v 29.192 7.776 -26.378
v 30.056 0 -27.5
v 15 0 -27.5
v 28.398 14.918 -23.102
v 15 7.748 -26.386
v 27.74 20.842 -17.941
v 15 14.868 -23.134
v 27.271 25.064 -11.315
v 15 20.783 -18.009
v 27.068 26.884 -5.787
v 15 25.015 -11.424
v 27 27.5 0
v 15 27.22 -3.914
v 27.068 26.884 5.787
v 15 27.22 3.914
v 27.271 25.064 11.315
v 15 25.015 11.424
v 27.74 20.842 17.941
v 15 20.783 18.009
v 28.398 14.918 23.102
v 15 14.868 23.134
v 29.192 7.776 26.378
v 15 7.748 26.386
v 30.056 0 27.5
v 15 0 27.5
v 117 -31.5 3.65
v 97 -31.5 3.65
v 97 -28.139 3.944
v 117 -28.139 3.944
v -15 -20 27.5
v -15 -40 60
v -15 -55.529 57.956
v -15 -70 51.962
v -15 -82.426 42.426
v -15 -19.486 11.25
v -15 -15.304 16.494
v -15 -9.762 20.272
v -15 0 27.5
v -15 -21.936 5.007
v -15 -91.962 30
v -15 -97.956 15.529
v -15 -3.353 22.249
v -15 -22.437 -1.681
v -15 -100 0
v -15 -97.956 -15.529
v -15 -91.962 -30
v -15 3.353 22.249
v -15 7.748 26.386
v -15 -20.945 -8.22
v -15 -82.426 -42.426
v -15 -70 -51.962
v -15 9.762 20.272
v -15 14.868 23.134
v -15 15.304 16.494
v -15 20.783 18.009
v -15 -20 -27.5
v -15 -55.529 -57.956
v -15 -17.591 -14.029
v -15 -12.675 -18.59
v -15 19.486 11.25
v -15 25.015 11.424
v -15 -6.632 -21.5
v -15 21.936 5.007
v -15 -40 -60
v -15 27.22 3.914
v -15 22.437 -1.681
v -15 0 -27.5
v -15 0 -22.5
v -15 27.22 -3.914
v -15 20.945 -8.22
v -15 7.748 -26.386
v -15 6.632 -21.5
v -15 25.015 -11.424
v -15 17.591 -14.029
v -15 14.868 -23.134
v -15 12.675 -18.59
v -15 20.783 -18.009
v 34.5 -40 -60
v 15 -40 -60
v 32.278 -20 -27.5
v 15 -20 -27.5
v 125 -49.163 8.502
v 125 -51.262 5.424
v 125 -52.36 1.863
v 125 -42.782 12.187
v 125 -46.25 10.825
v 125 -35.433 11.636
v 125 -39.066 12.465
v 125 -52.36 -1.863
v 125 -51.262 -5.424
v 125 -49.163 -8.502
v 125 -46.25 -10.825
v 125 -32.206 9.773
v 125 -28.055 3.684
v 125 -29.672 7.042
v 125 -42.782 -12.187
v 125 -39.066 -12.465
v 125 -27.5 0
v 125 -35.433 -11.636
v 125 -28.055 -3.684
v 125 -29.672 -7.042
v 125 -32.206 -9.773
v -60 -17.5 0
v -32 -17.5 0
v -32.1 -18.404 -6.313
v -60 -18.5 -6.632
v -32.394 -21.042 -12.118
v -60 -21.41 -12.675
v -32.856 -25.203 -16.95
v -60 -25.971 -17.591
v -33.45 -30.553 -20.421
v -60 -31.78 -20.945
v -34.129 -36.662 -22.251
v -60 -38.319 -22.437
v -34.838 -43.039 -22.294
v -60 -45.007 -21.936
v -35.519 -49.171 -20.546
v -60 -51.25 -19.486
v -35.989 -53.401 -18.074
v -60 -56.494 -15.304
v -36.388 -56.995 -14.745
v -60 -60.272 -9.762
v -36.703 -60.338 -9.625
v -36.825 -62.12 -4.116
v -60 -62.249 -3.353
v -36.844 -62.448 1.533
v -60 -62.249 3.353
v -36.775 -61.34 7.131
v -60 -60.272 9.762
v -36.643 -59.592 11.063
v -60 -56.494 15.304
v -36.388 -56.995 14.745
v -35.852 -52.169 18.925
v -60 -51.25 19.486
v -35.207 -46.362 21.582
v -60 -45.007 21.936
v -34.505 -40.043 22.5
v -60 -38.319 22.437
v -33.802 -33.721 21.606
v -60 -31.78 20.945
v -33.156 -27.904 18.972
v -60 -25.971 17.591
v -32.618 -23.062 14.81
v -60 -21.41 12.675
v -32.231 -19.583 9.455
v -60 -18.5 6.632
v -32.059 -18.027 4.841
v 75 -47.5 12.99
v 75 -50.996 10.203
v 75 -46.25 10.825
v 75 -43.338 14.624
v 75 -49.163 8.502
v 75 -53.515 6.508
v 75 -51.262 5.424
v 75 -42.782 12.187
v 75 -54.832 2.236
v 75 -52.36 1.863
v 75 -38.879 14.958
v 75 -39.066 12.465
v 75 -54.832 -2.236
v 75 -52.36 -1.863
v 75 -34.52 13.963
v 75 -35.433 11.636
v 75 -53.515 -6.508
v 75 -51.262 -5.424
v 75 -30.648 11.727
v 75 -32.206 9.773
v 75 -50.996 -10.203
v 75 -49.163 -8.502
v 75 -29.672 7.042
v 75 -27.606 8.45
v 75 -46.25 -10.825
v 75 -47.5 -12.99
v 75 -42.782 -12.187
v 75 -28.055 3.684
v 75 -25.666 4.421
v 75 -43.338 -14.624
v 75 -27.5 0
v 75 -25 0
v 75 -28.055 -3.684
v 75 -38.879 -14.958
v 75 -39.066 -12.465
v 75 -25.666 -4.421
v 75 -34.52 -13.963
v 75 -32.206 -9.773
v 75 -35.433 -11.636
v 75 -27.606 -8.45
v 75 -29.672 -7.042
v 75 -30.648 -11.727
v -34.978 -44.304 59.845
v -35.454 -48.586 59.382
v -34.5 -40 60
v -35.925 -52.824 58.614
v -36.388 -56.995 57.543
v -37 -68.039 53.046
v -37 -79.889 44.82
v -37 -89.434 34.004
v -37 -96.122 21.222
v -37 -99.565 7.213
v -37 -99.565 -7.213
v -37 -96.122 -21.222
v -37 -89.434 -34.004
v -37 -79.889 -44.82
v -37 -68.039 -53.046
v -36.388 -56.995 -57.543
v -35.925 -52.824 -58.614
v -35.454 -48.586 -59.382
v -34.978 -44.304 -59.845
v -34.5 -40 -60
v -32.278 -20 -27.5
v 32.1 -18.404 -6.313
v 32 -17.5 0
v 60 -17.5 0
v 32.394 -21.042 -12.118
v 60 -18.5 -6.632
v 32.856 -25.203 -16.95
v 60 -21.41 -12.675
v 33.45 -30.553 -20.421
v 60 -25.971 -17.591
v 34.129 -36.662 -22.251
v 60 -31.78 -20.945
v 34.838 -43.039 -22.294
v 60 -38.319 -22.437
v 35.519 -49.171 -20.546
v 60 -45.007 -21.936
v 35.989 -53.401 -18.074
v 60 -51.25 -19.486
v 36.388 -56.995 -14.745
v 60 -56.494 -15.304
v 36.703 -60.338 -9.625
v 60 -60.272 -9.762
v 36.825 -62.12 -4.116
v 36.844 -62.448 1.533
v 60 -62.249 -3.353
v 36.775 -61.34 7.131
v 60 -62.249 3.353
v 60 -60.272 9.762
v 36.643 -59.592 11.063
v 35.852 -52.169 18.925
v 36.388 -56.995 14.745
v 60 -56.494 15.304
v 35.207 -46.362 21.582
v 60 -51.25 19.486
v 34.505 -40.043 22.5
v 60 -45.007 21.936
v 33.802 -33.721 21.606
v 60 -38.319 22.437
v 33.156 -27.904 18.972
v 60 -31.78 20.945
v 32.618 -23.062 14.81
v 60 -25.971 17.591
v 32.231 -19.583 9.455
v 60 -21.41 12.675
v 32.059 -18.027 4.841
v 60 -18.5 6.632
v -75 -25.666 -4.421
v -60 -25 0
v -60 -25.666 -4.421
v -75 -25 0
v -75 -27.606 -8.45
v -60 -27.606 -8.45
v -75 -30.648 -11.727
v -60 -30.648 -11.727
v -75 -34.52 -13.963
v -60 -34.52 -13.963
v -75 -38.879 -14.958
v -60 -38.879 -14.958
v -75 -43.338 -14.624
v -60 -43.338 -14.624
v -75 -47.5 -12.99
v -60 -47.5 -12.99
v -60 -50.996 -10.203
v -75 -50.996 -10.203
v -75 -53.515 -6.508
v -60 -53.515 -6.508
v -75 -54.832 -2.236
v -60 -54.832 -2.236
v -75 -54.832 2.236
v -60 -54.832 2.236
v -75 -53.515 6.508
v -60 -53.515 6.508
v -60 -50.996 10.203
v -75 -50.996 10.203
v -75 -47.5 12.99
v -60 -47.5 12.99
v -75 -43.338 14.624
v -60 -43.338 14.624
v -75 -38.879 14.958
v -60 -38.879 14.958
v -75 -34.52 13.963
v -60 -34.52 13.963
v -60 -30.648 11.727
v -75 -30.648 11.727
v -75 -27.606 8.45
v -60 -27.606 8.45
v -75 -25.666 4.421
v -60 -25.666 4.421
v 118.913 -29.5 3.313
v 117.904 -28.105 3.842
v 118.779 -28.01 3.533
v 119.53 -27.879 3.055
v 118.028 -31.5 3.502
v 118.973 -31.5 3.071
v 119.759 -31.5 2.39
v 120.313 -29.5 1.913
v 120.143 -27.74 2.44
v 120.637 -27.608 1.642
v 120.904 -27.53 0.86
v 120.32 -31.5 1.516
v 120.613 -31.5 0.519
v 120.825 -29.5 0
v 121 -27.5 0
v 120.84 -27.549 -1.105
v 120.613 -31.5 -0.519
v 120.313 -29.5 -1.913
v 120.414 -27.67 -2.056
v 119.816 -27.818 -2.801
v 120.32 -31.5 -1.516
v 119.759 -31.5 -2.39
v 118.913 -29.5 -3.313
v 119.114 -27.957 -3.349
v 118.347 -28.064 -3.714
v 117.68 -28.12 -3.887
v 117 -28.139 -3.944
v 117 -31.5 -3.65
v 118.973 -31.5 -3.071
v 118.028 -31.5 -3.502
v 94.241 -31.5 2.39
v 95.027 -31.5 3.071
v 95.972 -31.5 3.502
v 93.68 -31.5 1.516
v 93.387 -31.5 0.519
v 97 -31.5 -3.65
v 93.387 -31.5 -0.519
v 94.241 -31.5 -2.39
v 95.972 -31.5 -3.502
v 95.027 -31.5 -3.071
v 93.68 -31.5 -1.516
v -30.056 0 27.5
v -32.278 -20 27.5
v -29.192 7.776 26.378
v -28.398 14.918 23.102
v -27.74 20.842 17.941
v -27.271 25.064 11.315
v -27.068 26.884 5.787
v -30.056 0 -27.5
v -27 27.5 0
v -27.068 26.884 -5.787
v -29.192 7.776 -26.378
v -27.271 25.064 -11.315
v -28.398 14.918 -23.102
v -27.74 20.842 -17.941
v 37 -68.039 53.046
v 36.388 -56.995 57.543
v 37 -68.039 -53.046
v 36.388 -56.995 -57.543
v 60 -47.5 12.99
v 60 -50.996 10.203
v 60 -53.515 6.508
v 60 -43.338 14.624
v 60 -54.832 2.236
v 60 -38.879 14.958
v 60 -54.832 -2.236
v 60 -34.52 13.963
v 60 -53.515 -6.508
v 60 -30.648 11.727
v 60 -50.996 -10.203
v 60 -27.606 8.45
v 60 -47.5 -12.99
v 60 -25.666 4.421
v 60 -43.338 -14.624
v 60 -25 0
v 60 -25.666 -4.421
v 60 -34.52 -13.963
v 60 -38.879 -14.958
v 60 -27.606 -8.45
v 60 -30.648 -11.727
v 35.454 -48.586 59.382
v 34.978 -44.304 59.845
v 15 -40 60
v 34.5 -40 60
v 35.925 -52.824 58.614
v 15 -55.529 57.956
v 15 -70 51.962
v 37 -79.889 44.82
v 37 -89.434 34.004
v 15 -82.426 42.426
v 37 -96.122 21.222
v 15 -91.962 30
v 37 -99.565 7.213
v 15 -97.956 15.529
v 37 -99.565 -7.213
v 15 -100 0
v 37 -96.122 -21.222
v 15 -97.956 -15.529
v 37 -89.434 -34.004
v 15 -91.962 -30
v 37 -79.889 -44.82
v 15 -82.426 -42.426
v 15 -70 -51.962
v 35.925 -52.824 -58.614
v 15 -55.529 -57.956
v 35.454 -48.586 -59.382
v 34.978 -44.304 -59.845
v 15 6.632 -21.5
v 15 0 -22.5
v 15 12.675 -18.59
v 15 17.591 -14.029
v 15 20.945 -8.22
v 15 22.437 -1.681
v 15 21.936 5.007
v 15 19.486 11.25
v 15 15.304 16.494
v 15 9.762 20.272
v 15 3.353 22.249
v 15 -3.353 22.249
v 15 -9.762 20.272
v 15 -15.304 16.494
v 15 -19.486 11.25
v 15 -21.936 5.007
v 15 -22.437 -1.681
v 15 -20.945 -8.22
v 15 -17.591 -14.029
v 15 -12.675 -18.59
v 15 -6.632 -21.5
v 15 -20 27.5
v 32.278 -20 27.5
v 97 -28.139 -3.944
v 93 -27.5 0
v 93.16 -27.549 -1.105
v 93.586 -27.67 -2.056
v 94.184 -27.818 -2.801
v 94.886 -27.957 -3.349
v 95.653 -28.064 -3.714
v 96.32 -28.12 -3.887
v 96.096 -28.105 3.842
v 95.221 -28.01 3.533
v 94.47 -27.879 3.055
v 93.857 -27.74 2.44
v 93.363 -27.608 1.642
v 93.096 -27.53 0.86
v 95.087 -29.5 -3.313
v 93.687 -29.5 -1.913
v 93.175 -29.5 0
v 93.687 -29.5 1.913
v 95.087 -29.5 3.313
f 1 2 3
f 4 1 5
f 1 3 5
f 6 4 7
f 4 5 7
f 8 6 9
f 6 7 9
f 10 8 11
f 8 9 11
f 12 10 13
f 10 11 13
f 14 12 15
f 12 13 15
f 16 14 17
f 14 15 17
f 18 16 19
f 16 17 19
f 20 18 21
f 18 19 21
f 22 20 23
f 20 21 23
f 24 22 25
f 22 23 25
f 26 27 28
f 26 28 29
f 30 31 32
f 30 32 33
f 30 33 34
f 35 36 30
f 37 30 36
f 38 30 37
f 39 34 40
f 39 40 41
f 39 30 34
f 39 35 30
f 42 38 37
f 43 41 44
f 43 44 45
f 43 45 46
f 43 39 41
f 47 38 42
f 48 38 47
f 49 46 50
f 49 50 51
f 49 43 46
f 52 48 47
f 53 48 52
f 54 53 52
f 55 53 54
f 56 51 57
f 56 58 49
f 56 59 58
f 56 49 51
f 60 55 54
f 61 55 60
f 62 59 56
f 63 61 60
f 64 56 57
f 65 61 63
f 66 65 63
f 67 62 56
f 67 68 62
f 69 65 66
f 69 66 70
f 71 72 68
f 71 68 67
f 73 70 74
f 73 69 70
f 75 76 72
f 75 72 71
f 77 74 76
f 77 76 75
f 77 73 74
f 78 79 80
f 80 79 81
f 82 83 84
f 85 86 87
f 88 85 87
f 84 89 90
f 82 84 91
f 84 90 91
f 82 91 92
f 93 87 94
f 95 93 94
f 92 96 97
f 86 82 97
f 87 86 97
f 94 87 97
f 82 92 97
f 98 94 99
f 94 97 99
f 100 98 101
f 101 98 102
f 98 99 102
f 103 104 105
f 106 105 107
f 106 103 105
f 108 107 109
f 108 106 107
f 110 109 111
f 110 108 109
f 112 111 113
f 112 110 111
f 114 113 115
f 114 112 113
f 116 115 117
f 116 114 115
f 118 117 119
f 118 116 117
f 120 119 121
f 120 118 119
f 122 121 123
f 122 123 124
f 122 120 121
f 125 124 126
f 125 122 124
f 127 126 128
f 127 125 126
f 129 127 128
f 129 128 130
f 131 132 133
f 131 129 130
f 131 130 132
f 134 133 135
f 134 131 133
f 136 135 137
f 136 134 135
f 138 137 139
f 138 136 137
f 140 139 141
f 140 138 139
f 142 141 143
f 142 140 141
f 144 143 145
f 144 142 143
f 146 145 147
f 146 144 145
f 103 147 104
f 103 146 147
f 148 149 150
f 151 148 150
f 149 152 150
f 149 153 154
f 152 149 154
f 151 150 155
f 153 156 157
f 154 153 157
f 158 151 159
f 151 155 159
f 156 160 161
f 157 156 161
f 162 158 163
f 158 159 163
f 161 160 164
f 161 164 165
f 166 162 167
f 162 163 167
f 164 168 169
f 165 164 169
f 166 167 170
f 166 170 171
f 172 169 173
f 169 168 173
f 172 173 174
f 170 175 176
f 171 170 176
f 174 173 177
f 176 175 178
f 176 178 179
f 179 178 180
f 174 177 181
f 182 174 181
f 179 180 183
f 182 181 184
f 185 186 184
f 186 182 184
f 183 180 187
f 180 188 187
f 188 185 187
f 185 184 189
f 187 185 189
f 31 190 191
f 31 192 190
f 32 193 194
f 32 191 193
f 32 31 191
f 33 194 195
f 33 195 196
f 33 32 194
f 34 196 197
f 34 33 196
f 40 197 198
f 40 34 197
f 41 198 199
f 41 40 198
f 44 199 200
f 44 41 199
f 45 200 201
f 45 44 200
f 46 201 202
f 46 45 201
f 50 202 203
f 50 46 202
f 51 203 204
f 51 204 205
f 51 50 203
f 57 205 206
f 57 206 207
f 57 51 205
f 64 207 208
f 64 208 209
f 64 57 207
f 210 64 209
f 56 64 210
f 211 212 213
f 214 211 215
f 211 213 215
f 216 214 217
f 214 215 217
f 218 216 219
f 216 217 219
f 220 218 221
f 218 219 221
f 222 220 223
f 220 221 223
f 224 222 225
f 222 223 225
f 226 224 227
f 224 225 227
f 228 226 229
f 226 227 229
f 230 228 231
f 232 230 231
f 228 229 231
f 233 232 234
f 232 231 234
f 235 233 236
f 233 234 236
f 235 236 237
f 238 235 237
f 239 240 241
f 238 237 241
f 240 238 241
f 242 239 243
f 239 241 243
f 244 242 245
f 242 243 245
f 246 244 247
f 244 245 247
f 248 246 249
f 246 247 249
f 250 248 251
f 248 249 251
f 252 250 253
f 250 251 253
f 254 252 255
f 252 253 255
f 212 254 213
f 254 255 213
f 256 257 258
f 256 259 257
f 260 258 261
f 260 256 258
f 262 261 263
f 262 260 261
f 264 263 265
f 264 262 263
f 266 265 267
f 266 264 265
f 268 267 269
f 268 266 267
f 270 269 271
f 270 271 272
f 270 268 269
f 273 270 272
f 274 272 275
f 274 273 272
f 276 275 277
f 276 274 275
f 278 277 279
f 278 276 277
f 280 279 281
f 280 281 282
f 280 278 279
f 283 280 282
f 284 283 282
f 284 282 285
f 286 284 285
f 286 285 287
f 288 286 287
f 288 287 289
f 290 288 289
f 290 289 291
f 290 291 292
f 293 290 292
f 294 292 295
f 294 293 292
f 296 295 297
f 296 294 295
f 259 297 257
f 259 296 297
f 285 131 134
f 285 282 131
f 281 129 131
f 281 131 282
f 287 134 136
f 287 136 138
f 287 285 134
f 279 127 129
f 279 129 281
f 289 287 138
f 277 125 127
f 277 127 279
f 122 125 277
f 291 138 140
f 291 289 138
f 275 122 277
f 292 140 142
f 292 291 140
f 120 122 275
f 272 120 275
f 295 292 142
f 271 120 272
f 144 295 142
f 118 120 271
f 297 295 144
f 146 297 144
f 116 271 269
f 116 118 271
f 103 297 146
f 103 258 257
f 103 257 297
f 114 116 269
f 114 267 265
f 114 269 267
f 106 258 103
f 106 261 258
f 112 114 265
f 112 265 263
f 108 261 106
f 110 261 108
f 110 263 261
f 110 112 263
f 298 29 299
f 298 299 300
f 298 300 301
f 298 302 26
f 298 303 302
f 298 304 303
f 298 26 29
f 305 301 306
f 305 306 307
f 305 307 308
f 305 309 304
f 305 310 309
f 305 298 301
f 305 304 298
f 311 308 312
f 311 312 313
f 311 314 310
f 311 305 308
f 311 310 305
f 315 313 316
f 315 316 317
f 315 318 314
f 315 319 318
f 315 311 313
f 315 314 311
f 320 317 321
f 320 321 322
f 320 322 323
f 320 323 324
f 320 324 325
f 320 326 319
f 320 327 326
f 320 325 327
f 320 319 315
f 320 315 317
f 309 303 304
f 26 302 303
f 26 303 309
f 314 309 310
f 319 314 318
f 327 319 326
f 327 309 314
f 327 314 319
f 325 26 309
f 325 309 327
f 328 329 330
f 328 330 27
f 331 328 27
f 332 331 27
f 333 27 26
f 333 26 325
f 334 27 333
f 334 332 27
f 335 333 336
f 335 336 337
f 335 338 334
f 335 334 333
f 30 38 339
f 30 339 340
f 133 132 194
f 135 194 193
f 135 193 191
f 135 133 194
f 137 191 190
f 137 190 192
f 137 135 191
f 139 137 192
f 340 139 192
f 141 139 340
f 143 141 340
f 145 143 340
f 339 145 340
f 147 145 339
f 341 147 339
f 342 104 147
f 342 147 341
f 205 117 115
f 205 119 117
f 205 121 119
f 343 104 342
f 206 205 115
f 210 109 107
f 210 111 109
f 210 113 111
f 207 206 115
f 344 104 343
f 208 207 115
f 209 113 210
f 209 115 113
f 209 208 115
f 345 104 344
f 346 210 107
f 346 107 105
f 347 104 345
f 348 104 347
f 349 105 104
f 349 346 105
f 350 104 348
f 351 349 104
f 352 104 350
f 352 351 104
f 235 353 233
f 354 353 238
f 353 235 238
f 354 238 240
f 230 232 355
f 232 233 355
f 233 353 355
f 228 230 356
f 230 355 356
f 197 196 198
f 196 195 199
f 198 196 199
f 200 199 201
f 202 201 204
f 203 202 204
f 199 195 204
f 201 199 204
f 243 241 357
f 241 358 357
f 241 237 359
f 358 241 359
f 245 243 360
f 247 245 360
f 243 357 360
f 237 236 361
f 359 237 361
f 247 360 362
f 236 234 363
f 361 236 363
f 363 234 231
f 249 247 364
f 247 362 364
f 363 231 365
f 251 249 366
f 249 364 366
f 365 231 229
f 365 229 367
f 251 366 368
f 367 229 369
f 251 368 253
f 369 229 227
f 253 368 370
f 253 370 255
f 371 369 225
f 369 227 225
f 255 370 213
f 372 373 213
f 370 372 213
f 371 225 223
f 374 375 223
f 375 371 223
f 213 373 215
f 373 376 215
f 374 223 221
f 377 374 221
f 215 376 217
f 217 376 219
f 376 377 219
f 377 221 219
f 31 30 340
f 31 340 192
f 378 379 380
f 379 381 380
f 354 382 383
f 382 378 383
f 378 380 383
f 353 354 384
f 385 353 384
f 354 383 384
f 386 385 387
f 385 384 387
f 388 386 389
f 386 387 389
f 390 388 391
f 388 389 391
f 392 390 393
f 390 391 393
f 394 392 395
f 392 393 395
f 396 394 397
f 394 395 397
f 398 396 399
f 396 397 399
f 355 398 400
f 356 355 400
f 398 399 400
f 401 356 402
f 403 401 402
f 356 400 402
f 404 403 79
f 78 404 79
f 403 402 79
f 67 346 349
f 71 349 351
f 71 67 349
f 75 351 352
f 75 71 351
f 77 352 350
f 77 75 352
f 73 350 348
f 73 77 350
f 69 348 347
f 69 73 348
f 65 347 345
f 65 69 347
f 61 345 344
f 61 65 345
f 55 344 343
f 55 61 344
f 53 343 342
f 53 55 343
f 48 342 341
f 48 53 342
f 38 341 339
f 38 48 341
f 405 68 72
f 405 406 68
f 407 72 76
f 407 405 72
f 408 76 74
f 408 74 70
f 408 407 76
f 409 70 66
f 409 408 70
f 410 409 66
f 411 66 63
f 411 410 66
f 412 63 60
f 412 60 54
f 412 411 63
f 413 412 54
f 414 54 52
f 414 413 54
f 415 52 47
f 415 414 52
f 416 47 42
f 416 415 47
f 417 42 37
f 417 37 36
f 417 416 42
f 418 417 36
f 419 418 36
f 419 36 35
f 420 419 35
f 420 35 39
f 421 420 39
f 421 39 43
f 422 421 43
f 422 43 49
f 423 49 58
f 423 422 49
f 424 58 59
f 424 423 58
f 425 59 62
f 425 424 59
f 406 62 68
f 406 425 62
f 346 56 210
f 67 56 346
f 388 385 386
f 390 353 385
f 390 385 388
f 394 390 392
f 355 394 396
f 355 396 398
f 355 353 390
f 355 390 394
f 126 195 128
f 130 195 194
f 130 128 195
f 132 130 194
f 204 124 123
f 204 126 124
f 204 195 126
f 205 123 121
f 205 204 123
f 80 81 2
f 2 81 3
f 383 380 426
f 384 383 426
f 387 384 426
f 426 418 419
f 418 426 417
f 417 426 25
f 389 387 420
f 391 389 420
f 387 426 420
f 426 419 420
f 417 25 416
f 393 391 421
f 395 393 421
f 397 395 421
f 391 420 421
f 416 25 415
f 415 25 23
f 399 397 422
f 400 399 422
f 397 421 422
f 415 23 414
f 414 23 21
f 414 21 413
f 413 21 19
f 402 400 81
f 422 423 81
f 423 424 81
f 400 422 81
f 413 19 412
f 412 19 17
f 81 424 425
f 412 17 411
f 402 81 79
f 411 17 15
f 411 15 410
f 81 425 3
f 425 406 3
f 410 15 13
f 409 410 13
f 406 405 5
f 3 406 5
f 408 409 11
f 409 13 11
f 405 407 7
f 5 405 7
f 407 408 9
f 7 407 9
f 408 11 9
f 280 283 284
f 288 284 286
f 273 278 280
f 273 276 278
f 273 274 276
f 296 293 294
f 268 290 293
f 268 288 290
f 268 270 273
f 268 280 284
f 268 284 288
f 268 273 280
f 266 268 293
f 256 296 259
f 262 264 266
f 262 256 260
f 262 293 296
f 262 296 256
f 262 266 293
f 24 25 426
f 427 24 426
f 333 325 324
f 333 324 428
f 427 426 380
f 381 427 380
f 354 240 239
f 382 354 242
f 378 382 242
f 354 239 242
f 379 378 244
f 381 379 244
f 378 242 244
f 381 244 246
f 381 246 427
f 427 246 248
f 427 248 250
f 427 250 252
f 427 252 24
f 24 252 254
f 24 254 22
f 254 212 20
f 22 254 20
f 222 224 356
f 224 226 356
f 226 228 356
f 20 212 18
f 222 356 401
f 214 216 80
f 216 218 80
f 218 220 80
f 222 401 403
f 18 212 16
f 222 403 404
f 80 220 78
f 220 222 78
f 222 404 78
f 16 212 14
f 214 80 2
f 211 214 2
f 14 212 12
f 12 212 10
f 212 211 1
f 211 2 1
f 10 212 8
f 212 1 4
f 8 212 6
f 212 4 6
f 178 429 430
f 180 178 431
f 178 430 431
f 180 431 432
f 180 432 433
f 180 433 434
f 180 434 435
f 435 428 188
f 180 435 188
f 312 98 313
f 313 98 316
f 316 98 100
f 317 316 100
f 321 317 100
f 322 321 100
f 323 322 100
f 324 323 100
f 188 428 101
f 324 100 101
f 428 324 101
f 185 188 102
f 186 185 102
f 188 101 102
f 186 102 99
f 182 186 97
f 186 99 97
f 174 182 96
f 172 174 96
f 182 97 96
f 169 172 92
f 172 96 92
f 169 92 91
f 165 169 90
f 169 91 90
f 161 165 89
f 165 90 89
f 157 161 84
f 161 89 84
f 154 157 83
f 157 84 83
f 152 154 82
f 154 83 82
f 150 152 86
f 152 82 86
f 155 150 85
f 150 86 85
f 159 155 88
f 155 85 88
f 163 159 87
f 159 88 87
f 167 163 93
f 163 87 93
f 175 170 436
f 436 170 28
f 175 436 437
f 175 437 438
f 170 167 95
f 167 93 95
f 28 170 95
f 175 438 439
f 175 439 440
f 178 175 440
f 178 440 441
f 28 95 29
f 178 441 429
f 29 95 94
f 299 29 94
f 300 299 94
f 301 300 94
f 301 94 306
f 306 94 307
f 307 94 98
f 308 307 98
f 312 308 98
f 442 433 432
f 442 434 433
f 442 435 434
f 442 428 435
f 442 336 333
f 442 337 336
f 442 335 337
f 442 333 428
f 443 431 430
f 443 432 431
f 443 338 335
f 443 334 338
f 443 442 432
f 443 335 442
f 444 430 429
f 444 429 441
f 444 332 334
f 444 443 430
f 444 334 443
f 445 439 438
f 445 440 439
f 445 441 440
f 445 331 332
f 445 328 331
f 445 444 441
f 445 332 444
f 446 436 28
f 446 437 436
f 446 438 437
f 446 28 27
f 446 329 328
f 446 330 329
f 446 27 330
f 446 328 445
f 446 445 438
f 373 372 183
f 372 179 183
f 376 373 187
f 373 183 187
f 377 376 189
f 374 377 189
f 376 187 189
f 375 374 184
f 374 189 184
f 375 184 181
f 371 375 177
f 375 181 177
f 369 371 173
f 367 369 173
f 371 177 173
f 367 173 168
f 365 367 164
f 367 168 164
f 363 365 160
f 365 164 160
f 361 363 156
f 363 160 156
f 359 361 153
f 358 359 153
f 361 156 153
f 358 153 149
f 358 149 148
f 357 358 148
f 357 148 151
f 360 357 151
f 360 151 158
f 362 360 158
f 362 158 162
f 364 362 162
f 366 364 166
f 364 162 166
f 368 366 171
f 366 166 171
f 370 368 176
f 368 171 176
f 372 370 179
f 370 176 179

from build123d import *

# Parameters (mm, degrees)
SKETCH1_R               = 22.5
BOSS_EXTRUDE1_DEPTH     = 15
BOSS_EXTRUDE2_DEPTH     = 22
CUT_EXTRUDE1_DEPTH      = 61
CUT_EXTRUDE1_DEPTH_BACK = 61
FILLET1_R               = 100
CUT_EXTRUDE2_START      = -27.5
CUT_EXTRUDE2_DEPTH      = 4
CUT_EXTRUDE2_TAPER      = 5
CUT_EXTRUDE3_DEPTH      = 61.0000001
CUT_EXTRUDE3_DEPTH_BACK = 61.0000001


with BuildPart() as part:
    # Sketch1 → Boss-Extrude1 (new body)
    with BuildSketch(Plane(origin=(0, 0, 0), x_dir=(0, 0, -1), z_dir=(1, 0, 0))):
        Circle(SKETCH1_R)
    extrude(amount=BOSS_EXTRUDE1_DEPTH)

    # Sketch2 → Boss-Extrude2 (add)
    with BuildSketch(Plane(origin=(15, 0, 0), x_dir=(0, 0, -1), z_dir=(1, 0, 0))):
        with BuildLine():
            Line((-27.5, 0), (-27.5, -20))
            Line((-27.5, -20), (-60, -40))
            ThreePointArc((-60, -40), (0, -100), (60, -40))
            Line((60, -40), (27.5, -20))
            Line((27.5, -20), (27.5, 0))
            ThreePointArc((27.5, 0), (0, 27.5), (-27.5, 0))
        make_face()
    extrude(amount=BOSS_EXTRUDE2_DEPTH)

    # Sketch3 → Cut-Extrude1 (cut, two sides)
    with BuildSketch(Plane.XY) as cut_extrude1_sk:
        Polygon((27, 27.5), (37, 27.5), (37, -62.5), align=None)
    extrude(amount=CUT_EXTRUDE1_DEPTH, mode=Mode.SUBTRACT)
    extrude(cut_extrude1_sk.sketch, amount=-CUT_EXTRUDE1_DEPTH_BACK, mode=Mode.SUBTRACT)

    # Fillet1
    fillet1_edges = [part.edges().sort_by_distance(p)[0] for p in [
        (37, -62.5, 0),
    ]]
    fillet(fillet1_edges, radius=FILLET1_R)

    # Sketch4 → Revolve1 (revolve)
    with BuildSketch(Plane.XY):
        Polygon((25.790103906, -17.5), (60, -17.5), (60, -25), (75, -25), (75, -27.5), (125, -27.5), (125, -40), (25.790103906, -40), align=None)
    revolve(axis=Axis((125, -40, 0), (-1, 0, 0)))

    # Sketch5 → Cut-Extrude2 (cut)
    with BuildSketch(Plane(origin=(0, 0, 0), x_dir=(1, 0, 0), z_dir=(0, 1, 0)).offset(CUT_EXTRUDE2_START)):
        with BuildLine():
            ThreePointArc((97, 4), (93, 0), (97, -4))
            Line((97, -4), (117, -4))
            ThreePointArc((117, -4), (121, 0), (117, 4))
            Line((117, 4), (97, 4))
        make_face()
    extrude(amount=-CUT_EXTRUDE2_DEPTH, taper=CUT_EXTRUDE2_TAPER, mode=Mode.SUBTRACT)

    # Mirror1: part across plane


with BuildPart() as part_1:
    add(part.part)
    add(part.part.mirror(Plane(origin=(0, 0, 0), x_dir=(0, 0, 1), z_dir=(1, 0, 0))))

    # Sketch6 → Cut-Extrude3 (cut, two sides)
    with BuildSketch(Plane.XY) as cut_extrude3_sk:
        Polygon((-75, -520.584014882), (-75, -67.635702331), (-75, -7.558349371), (-75, 445.38996318), (-980.896625102, 445.38996318), (-980.896625102, -520.584014882), align=None)
    extrude(amount=CUT_EXTRUDE3_DEPTH, mode=Mode.SUBTRACT)
    extrude(cut_extrude3_sk.sketch, amount=-CUT_EXTRUDE3_DEPTH_BACK, mode=Mode.SUBTRACT)


solid = part_1.part
